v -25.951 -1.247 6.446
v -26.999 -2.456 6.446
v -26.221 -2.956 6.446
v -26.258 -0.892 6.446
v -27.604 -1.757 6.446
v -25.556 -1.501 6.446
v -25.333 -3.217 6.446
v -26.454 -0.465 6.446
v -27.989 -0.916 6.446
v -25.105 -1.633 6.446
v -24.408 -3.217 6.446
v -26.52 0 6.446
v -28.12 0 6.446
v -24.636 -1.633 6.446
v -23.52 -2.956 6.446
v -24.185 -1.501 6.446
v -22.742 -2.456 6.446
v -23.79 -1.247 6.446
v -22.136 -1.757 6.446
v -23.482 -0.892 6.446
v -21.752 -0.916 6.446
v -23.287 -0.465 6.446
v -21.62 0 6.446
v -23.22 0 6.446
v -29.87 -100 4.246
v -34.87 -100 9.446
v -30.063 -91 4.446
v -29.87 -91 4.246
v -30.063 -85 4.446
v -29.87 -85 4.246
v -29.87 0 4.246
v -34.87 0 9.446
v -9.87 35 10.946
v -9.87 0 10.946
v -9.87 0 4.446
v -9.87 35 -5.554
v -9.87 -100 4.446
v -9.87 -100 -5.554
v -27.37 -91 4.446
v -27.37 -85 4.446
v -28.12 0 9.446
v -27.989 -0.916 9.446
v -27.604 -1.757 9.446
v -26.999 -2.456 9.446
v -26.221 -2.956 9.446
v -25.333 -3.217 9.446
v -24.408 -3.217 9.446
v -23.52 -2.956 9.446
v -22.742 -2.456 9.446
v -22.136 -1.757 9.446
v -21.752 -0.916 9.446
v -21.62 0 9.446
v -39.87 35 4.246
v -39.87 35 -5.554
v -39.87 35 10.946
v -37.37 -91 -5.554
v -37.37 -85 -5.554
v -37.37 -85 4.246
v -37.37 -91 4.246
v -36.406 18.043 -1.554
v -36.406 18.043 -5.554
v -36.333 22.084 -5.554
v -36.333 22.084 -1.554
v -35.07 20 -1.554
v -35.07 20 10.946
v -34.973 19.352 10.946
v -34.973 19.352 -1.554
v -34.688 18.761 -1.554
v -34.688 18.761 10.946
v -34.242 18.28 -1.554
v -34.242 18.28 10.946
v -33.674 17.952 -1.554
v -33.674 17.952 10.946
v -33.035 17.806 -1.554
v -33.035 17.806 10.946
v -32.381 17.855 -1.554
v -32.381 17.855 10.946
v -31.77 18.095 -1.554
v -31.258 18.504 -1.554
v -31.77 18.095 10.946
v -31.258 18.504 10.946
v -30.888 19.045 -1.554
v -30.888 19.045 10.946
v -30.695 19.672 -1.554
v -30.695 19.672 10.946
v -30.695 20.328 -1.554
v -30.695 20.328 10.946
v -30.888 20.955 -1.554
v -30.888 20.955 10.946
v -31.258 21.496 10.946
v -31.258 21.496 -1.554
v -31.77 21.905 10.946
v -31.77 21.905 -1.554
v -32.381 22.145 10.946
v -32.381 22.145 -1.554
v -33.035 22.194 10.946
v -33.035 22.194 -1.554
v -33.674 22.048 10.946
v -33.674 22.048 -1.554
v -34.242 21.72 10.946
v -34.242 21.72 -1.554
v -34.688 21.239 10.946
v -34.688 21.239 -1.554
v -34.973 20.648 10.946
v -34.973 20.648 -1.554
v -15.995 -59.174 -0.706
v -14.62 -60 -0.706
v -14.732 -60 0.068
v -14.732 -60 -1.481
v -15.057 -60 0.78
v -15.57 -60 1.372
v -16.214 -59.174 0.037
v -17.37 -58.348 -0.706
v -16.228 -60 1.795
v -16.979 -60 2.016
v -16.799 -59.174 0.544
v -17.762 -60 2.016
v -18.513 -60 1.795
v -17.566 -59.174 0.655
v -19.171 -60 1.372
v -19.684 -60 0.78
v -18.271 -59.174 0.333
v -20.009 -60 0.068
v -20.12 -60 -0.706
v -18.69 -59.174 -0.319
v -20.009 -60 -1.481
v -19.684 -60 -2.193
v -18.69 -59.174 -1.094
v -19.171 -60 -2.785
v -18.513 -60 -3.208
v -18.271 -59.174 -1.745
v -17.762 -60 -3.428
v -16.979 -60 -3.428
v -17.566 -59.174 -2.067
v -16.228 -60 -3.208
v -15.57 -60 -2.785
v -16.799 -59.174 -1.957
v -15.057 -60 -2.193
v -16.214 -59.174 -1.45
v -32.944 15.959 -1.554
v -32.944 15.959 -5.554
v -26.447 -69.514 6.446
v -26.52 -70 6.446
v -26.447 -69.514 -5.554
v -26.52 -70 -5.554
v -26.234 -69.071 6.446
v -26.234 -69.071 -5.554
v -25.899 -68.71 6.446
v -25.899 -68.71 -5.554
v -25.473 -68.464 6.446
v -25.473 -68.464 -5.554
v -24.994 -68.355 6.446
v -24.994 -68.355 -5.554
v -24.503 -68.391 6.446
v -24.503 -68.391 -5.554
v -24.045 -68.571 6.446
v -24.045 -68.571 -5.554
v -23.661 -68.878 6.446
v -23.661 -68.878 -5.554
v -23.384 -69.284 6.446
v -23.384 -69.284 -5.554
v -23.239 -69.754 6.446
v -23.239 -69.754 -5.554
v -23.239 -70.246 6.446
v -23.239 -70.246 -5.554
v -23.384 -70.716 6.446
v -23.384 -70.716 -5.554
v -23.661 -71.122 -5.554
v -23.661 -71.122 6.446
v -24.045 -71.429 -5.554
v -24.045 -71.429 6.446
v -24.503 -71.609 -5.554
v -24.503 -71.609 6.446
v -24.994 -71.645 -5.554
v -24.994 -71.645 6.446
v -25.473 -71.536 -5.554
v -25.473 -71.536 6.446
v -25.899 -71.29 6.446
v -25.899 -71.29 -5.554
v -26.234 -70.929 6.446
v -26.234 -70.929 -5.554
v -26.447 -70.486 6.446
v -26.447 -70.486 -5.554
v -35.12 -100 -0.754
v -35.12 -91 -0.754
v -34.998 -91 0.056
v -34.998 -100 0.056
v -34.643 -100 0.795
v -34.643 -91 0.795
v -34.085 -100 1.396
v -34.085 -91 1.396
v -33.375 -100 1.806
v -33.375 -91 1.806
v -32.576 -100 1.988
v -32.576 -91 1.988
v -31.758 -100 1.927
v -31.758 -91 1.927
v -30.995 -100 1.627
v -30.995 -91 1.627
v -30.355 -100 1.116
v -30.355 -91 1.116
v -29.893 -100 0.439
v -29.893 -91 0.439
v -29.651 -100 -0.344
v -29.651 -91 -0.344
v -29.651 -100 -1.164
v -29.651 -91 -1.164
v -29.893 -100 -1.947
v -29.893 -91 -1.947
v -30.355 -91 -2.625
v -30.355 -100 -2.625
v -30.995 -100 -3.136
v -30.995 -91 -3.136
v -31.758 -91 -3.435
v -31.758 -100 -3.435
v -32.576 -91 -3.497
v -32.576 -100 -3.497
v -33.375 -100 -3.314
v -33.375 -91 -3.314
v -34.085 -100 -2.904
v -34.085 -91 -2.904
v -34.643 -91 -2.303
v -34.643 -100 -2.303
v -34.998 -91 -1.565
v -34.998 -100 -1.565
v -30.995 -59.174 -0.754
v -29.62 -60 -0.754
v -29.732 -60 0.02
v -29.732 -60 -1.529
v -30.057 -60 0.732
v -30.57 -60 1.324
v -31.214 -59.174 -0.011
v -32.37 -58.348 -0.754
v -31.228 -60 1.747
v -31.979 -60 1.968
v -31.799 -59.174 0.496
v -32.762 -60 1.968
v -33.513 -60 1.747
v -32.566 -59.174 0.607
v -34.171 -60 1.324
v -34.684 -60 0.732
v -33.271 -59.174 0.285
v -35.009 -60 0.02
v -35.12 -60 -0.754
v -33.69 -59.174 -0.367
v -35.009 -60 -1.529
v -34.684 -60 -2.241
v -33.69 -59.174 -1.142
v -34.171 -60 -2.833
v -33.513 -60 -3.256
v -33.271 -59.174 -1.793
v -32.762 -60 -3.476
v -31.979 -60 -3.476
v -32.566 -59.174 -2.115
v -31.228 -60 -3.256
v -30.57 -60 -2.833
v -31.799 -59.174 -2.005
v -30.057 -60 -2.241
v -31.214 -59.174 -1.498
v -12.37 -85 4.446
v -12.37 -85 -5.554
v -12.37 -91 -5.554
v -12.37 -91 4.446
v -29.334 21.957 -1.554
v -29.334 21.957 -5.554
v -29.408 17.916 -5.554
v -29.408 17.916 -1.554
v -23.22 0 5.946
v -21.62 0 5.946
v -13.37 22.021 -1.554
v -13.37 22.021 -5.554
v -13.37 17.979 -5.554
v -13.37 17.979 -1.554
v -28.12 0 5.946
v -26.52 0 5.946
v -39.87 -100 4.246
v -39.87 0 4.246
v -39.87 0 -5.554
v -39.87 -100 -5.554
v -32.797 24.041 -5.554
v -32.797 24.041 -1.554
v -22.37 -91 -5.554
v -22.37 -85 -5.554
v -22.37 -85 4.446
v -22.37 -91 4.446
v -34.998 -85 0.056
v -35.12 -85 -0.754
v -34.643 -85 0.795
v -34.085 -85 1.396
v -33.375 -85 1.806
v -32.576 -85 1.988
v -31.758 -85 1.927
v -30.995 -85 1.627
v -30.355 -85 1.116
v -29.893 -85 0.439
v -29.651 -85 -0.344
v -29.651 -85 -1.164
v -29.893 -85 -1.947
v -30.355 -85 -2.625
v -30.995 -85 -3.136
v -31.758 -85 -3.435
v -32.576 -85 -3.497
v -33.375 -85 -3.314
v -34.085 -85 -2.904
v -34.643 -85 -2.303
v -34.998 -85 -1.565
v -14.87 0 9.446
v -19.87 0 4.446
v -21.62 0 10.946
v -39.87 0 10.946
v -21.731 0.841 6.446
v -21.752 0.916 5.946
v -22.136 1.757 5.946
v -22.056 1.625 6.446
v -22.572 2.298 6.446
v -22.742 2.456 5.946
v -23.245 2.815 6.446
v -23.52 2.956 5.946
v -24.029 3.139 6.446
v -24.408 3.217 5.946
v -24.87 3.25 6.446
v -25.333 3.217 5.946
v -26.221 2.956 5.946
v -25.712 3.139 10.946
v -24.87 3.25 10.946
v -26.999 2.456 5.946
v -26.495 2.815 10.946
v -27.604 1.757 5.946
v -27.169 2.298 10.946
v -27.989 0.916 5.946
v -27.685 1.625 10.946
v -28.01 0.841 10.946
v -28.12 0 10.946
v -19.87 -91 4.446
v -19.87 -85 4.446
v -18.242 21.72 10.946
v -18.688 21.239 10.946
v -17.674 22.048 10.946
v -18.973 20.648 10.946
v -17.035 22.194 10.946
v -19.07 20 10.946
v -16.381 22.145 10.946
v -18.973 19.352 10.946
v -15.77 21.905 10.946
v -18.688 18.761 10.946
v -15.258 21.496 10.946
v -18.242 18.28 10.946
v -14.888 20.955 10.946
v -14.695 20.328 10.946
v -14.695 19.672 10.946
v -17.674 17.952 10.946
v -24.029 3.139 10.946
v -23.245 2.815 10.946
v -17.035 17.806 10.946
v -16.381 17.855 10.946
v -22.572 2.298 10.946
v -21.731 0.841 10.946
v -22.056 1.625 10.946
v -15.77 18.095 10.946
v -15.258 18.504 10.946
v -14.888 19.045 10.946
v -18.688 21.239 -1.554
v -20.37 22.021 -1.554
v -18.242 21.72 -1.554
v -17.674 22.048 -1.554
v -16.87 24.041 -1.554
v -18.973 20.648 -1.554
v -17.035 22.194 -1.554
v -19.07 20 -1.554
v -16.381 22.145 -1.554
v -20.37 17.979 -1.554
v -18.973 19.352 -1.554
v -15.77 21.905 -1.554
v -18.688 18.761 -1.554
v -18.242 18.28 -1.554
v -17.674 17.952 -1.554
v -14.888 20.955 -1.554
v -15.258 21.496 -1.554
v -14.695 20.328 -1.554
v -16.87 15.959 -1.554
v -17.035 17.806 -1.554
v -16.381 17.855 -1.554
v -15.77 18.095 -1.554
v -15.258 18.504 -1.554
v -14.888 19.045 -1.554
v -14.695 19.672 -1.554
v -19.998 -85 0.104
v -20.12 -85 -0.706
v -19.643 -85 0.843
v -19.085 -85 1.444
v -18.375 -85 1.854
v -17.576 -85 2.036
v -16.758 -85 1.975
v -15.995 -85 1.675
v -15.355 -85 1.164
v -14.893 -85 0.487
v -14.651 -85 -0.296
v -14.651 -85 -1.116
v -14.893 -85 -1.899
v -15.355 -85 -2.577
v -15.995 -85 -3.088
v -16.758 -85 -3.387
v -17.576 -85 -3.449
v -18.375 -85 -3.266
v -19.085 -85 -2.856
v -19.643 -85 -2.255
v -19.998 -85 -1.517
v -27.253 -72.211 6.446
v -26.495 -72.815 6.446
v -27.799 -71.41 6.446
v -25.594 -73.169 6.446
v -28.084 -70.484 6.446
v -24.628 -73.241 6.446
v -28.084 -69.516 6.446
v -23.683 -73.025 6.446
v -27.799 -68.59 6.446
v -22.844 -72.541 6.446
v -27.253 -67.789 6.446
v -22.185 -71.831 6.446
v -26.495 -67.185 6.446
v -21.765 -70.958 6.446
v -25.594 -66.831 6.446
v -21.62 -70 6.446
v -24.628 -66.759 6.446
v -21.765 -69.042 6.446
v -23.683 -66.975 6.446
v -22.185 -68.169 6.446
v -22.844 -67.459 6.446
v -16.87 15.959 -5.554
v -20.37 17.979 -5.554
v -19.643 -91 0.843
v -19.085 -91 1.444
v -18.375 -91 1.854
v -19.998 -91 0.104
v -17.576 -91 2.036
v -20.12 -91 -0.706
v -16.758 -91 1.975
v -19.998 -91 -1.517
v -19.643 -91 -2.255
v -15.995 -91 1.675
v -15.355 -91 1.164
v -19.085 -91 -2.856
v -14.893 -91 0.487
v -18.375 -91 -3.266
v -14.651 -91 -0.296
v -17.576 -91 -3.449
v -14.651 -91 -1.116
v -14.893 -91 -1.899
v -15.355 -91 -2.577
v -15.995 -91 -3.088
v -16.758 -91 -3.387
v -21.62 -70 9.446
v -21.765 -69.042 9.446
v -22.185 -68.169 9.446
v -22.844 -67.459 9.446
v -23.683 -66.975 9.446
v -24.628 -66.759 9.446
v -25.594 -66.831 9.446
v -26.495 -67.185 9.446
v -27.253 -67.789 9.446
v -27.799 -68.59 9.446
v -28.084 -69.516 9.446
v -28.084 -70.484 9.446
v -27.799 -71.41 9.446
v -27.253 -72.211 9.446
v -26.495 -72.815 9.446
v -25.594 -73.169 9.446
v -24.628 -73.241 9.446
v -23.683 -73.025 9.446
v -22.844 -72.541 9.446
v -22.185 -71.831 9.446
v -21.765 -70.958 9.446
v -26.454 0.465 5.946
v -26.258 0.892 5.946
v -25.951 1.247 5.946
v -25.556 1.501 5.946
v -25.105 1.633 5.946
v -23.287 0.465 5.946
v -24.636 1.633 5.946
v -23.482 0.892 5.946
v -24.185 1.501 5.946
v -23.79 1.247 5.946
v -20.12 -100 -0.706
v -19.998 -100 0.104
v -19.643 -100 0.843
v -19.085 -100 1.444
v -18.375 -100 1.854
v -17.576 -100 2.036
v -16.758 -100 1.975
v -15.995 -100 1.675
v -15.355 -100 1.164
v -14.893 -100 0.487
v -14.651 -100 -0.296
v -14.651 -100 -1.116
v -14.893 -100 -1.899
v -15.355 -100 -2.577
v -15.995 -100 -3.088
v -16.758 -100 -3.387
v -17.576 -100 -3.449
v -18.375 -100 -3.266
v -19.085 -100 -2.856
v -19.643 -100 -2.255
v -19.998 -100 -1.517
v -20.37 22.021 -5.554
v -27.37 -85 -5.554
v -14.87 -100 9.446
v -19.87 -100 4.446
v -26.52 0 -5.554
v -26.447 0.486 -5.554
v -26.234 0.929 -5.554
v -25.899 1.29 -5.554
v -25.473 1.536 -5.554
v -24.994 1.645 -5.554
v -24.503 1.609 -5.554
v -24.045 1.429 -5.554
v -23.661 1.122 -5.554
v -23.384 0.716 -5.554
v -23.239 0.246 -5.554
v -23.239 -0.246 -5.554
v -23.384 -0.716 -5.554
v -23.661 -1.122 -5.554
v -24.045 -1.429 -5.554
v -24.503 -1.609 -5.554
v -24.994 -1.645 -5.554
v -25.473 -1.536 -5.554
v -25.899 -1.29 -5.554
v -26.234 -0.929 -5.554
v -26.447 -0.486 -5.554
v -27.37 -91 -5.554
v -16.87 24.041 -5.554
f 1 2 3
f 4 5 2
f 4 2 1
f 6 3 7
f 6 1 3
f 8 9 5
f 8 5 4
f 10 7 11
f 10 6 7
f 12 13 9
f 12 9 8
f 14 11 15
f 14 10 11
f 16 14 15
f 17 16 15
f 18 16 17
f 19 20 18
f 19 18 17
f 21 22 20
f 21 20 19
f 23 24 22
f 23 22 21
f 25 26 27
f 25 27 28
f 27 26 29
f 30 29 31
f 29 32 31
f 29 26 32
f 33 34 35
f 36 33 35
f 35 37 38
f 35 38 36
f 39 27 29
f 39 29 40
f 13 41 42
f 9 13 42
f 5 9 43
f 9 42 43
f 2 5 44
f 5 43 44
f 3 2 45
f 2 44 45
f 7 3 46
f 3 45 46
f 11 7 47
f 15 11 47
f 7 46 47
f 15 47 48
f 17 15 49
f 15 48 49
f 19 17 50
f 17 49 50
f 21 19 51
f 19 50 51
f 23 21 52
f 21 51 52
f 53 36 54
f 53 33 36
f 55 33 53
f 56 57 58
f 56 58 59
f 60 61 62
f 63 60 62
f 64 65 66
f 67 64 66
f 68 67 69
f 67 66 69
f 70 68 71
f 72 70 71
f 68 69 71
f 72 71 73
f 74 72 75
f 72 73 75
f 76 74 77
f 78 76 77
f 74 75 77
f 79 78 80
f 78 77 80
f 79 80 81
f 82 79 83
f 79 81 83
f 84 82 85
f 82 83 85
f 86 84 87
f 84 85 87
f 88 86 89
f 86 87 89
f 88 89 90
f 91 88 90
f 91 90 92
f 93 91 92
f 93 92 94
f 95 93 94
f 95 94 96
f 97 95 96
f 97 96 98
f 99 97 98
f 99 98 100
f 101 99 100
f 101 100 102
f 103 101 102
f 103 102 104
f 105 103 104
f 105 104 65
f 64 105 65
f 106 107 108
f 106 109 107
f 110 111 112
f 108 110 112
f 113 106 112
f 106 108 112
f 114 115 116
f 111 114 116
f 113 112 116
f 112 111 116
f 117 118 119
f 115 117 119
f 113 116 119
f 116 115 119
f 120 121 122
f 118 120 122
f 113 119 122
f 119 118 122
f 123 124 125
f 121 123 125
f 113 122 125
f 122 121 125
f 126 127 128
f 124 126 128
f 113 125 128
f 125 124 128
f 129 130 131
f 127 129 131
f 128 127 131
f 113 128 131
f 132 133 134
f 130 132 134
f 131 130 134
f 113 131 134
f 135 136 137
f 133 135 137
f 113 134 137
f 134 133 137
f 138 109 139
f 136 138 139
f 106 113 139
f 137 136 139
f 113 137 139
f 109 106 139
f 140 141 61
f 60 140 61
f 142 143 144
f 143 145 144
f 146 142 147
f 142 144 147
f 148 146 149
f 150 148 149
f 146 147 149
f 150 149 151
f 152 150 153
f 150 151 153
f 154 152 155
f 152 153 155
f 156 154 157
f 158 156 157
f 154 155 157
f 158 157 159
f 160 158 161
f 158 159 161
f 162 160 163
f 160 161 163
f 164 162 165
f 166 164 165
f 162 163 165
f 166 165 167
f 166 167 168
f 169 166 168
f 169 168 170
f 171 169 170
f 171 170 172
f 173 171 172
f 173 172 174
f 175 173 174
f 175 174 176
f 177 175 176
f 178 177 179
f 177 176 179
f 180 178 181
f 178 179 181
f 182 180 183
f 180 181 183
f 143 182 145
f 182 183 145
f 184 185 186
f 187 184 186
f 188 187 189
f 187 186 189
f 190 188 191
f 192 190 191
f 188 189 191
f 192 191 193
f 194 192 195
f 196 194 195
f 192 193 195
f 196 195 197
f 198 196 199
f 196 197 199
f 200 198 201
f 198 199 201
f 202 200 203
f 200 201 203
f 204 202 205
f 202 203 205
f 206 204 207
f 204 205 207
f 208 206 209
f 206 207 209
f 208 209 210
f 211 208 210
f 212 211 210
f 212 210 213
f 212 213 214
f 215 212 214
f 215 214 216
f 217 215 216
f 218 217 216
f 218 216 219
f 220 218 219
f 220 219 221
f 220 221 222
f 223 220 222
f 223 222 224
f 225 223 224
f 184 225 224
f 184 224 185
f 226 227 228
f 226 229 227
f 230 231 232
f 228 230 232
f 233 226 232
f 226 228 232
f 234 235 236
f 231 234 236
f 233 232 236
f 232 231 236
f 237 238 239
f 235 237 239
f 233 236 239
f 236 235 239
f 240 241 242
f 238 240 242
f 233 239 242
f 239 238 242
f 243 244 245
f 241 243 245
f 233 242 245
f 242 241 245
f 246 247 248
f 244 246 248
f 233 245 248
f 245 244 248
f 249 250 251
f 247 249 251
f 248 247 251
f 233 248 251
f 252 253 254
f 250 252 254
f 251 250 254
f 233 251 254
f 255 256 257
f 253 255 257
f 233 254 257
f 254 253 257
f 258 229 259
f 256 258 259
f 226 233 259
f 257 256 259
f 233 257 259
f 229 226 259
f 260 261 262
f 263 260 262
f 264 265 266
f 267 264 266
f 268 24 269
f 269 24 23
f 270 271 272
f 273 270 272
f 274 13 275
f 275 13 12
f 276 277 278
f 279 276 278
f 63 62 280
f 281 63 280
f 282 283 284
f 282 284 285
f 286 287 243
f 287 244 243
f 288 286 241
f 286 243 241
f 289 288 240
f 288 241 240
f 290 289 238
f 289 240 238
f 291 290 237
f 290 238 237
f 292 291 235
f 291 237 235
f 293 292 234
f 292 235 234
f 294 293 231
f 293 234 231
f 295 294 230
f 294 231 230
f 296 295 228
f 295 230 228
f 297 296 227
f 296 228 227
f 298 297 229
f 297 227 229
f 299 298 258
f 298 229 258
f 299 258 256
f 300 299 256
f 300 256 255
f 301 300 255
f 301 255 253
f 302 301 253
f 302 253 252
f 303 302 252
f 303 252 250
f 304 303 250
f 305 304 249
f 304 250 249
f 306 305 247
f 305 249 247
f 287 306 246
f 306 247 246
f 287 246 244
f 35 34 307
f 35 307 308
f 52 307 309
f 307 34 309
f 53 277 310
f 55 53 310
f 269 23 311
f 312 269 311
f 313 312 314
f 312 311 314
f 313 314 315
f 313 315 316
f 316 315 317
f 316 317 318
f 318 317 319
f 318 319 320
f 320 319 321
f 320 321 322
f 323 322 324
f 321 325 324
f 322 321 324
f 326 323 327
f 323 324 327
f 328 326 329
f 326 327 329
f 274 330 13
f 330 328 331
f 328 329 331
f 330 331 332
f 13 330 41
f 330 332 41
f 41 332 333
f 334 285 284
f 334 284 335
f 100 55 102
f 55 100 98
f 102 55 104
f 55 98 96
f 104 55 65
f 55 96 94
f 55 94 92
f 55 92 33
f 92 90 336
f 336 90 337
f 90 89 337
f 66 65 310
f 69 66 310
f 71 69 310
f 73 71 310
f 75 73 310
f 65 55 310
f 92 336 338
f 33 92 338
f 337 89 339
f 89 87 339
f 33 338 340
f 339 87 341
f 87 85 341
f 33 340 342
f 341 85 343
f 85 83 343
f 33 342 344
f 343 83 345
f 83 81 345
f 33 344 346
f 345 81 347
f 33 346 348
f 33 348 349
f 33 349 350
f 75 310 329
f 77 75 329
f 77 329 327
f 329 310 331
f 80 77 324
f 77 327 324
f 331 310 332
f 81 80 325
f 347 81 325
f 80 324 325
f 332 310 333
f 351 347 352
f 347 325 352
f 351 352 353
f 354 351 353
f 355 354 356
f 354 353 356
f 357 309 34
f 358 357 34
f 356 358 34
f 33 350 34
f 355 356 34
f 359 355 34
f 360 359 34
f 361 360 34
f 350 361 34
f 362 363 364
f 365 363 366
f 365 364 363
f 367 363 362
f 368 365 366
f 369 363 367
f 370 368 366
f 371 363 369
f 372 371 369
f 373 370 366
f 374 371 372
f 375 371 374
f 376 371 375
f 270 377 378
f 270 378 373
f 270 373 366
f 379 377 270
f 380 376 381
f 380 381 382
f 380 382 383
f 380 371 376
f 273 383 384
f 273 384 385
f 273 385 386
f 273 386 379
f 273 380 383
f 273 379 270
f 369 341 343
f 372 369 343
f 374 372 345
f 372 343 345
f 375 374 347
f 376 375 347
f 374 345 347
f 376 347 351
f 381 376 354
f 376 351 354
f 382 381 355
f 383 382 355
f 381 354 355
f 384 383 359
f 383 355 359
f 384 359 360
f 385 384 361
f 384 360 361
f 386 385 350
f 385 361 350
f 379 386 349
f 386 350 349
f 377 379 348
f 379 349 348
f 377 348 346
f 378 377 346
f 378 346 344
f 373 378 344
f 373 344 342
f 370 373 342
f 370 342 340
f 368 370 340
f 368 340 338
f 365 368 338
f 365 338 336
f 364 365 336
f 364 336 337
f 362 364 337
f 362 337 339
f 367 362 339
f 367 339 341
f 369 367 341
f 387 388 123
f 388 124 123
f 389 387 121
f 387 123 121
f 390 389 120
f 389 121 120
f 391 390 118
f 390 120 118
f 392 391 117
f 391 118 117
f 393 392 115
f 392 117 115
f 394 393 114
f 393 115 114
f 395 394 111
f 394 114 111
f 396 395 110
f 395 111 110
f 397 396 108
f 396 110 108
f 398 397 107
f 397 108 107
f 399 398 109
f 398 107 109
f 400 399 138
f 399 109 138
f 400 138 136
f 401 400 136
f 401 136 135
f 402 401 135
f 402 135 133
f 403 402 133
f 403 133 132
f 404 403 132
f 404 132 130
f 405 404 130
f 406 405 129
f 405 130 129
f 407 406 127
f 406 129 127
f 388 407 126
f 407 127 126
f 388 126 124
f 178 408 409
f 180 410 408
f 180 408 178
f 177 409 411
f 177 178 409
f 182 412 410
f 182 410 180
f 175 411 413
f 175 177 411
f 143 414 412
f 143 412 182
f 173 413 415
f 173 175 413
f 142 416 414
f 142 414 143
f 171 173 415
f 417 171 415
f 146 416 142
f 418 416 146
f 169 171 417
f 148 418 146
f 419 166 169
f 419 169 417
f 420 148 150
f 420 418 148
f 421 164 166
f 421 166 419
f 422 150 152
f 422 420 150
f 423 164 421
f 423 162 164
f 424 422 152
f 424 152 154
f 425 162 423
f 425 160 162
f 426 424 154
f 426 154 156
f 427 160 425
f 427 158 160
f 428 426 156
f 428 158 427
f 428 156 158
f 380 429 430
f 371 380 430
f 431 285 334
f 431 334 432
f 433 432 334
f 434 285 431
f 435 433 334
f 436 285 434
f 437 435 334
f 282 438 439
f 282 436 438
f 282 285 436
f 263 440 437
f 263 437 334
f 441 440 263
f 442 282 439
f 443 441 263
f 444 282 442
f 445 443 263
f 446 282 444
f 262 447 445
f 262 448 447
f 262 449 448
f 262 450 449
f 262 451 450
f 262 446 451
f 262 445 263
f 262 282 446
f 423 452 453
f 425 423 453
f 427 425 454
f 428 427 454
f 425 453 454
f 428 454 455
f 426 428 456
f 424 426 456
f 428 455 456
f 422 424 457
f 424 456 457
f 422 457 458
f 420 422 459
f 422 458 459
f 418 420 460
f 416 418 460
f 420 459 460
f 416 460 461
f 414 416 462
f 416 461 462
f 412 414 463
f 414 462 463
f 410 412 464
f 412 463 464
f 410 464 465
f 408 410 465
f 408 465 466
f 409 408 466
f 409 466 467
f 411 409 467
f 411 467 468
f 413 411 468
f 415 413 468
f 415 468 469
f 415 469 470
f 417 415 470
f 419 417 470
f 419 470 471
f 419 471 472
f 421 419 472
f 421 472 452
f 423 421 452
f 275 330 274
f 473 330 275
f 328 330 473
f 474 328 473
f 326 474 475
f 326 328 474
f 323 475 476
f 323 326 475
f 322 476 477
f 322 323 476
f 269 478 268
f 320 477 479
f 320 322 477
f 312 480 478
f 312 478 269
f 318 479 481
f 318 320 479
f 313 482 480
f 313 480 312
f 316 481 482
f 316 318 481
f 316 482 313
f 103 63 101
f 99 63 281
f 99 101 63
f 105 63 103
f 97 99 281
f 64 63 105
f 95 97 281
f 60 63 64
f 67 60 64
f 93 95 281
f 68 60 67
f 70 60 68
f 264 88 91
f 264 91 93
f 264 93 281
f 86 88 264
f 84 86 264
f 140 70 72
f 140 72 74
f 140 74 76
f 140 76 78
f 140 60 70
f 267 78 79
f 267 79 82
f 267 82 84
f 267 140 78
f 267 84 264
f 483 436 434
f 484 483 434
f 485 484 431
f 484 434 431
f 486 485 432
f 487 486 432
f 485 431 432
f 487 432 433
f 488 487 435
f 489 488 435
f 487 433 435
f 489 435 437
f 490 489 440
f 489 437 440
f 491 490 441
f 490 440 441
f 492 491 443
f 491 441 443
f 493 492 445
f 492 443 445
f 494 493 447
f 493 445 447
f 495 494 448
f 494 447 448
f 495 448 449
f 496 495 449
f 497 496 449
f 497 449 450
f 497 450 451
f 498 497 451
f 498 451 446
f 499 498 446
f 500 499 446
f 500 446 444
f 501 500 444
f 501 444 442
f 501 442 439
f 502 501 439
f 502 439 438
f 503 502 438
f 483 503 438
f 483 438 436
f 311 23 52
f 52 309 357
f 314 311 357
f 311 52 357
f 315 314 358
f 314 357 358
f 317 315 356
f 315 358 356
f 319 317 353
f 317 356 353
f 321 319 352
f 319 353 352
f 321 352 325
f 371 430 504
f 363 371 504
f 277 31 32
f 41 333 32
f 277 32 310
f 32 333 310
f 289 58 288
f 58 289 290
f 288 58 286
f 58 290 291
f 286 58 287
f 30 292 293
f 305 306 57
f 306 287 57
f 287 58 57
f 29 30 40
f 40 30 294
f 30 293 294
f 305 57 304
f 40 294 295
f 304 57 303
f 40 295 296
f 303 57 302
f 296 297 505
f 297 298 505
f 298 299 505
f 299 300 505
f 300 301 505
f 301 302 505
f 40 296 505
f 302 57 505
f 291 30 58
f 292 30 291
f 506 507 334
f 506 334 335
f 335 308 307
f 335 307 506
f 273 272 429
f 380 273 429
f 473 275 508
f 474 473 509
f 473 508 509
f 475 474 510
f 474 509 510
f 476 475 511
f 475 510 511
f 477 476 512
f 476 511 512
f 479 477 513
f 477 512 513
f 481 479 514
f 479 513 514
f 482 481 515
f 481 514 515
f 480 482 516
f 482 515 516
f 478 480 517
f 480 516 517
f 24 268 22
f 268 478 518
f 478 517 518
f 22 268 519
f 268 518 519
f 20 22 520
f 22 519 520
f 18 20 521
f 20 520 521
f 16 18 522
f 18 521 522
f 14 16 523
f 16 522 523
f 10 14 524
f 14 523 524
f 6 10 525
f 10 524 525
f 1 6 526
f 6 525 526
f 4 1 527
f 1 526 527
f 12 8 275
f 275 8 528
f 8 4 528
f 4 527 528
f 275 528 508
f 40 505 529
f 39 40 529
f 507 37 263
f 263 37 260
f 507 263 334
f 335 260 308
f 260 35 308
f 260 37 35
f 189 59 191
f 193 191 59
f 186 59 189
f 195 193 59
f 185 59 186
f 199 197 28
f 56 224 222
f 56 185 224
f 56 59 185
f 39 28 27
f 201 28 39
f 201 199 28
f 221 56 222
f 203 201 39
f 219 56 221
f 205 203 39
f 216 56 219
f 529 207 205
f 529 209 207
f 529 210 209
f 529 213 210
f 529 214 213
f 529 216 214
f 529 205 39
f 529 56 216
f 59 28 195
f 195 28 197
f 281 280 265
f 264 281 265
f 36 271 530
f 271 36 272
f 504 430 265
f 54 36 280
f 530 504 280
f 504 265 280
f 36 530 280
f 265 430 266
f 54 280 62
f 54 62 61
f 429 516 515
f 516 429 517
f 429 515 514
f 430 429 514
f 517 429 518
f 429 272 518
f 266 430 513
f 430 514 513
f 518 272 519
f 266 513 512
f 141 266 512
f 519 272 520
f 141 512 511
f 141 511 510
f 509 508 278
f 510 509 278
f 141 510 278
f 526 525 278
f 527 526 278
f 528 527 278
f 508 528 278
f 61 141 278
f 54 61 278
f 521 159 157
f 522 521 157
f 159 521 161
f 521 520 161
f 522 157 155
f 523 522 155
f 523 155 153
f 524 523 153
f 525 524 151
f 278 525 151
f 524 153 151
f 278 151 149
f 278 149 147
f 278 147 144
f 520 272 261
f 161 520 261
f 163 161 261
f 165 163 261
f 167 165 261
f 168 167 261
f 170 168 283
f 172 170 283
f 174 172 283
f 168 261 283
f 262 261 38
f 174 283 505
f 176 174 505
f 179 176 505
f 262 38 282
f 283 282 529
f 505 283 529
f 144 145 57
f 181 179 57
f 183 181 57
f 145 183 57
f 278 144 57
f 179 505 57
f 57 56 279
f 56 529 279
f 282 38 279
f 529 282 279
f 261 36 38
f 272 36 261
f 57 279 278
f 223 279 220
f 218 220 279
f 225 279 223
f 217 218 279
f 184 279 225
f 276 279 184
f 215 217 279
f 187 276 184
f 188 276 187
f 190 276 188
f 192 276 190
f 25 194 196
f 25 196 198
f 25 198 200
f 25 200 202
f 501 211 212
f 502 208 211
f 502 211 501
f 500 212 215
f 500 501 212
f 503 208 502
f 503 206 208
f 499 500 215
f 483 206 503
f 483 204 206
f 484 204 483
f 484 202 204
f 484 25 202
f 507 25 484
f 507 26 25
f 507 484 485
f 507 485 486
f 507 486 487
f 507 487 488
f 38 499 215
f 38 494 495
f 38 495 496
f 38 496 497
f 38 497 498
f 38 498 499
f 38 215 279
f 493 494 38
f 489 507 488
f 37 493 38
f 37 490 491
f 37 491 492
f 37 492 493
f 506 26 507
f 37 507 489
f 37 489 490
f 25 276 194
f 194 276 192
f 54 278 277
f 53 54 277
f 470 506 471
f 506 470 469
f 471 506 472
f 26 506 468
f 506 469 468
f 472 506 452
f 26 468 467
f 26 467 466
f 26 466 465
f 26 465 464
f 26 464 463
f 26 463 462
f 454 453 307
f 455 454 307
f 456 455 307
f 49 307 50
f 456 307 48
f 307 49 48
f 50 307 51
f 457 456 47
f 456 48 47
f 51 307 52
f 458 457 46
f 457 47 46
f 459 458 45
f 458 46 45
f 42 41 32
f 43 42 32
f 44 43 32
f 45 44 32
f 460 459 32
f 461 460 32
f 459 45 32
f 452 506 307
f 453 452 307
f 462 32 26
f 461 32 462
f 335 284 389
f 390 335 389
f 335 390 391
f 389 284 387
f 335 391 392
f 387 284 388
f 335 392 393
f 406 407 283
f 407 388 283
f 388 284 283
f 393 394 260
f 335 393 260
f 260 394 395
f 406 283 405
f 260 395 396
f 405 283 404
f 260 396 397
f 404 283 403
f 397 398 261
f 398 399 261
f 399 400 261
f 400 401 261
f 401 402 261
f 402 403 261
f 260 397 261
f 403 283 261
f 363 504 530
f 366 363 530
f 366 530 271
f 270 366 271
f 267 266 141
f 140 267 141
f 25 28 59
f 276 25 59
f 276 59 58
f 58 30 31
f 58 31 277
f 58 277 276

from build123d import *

# Parameters (mm, degrees)
F0_R            = 2.5000000706
F0_R_2          = 2.5000000298
F1_DEPTH        = 100
F3_DEPTH        = 35
F6_D            = 4.4
F6_DEPTH        = 40
F6_TIP          = 1.3218933619
F5_W            = 10
F5_H            = 6
F7_DEPTH        = 10
F9_D            = 5.5
F9_DEPTH        = 40
F9_TIP          = 1.6523667023
F10_DEPTH       = 4
F12_D           = 3.3
F12_CBORE_D     = 6.5
F12_CBORE_DEPTH = 3
F14_DEPTH       = 5


# Not quite as in the source:
# - ends of sketch curves that miss each other by under 0.0002 mm in the source are joined
# - a feature names something its author has since deleted; it is built from what else it names


with BuildPart() as f1:
    # F0 (on Front) → F1 (new body)
    with BuildSketch(Plane.XZ):
        Polygon((-39.8704047501, 4.2457092745), (-39.8704047501, -5.5542903855), (-9.8704054207, -5.5542903855), (-9.8704054207, 4.4457092745), (-19.8704054207, 4.4457092745), (-14.8704054207, 9.4457092745), (-24.8704050854, 9.4457092745), (-34.8704047501, 9.4457092745), (-29.8704047501, 4.2457092745), align=None)
        with Locations((-32.3704050442, -0.7542907016)):
            Circle(F0_R, mode=Mode.SUBTRACT)
        with Locations((-17.3704050202, -0.7062930843)):
            Circle(F0_R_2, mode=Mode.SUBTRACT)
        with Locations((-32.3704050442, -0.7542907016)):
            Circle(F0_R)
        with Locations((-17.3704050202, -0.7062930843)):
            Circle(F0_R_2)
    extrude(amount=F1_DEPTH)

    # F2 (on face) → F3 (join)
    with BuildSketch(Plane(origin=(0, 0, 0), x_dir=(-1, 0, 0), z_dir=(0, 1, 0))):
        Polygon((9.8704054207, 4.4457092745), (9.8704054207, -5.5542903855), (39.8704054207, -5.5542903855), (39.8704054207, 4.2457092745), (29.8704047501, 4.2457092745), (34.8704047501, 9.4457092745), (14.8704054207, 9.4457092745), (19.8704054207, 4.4457092745), align=None)
        Polygon((9.8704054207, 10.9457096145), (9.8704054207, 4.4457092745), (19.8704054207, 4.4457092745), (14.8704054207, 9.4457092745), (34.8704047501, 9.4457092745), (29.8704047501, 4.2457092745), (39.8704047501, 4.2457092745), (39.8704054207, 10.9457096145), align=None)
    extrude(amount=F3_DEPTH)

    # F4: union 

    # F6
    with Locations(Plane(origin=(0, 0, -5.5542903855), x_dir=(1, 0, 0), z_dir=(0, 0, -1))):
        with Locations((-16.8704054207, -20), (-32.8704047501, -20)):
            Hole(F6_D / 2, depth=F6_DEPTH)
            with Locations((0, 0, -(F6_DEPTH + F6_TIP / 2))):  # 118° drill point
                Cone(0, F6_D / 2, F6_TIP, mode=Mode.SUBTRACT)

    # F5 (on face) → F7 (cut)
    with BuildSketch(Plane(origin=(0, 0, -5.5542903855), x_dir=(1, 0, 0), z_dir=(0, 0, -1))):
        with Locations((-17.3704054207, 88)):
            Rectangle(F5_W, F5_H)
        with Locations((-32.3704047501, 88)):
            Rectangle(F5_W, F5_H)
    extrude(amount=-F7_DEPTH, mode=Mode.SUBTRACT)

    # F9
    with Locations(Plane.XZ.offset(100)):
        with Locations((-32.3704050442, -0.7542907016), (-17.3704050202, -0.7062930843)):
            Hole(F9_D / 2, depth=F9_DEPTH)
            with Locations((0, 0, -(F9_DEPTH + F9_TIP / 2))):  # 118° drill point
                Cone(0, F9_D / 2, F9_TIP, mode=Mode.SUBTRACT)

    # F5 (on face) → F10 (cut)
    with BuildSketch(Plane(origin=(0, 0, -5.5542903855), x_dir=(1, 0, 0), z_dir=(0, 0, -1))):
        Polygon((-20.3704054207, -17.9792740578), (-20.3704054207, -22.0207259422), (-16.8704054207, -24.0414518843), (-13.3704054207, -22.0207259422), (-13.3704054207, -17.9792740578), (-16.8704054207, -15.9585481157), align=None)
        Polygon((-32.7971248335, -24.0407874712), (-29.3343401905, -21.9569314662), (-29.4076201071, -17.9161439951), (-32.9436846667, -15.9592125288), (-36.4064693097, -18.0430685338), (-36.3331893931, -22.0838560049), align=None)
    extrude(amount=-F10_DEPTH, mode=Mode.SUBTRACT)

    # F12 (through all)
    with Locations(Plane.XY.offset(9.4457092745)):
        with Locations((-24.8704050854, 0), (-24.8704050854, -70)):
            CounterBoreHole(F12_D / 2, F12_CBORE_D / 2, F12_CBORE_DEPTH)

    # F13 (on face) → F14 (cut)
    with BuildSketch(Plane.XY.offset(10.9457096145)):
        with BuildLine():
            Line((-28.1204054207, 0), (-21.6204054207, 0))
            ThreePointArc((-21.6204054207, 0), (-24.8704054207, 3.25), (-28.1204054207, 0))
        make_face()
    extrude(amount=-F14_DEPTH, mode=Mode.SUBTRACT)


solid = f1.part
